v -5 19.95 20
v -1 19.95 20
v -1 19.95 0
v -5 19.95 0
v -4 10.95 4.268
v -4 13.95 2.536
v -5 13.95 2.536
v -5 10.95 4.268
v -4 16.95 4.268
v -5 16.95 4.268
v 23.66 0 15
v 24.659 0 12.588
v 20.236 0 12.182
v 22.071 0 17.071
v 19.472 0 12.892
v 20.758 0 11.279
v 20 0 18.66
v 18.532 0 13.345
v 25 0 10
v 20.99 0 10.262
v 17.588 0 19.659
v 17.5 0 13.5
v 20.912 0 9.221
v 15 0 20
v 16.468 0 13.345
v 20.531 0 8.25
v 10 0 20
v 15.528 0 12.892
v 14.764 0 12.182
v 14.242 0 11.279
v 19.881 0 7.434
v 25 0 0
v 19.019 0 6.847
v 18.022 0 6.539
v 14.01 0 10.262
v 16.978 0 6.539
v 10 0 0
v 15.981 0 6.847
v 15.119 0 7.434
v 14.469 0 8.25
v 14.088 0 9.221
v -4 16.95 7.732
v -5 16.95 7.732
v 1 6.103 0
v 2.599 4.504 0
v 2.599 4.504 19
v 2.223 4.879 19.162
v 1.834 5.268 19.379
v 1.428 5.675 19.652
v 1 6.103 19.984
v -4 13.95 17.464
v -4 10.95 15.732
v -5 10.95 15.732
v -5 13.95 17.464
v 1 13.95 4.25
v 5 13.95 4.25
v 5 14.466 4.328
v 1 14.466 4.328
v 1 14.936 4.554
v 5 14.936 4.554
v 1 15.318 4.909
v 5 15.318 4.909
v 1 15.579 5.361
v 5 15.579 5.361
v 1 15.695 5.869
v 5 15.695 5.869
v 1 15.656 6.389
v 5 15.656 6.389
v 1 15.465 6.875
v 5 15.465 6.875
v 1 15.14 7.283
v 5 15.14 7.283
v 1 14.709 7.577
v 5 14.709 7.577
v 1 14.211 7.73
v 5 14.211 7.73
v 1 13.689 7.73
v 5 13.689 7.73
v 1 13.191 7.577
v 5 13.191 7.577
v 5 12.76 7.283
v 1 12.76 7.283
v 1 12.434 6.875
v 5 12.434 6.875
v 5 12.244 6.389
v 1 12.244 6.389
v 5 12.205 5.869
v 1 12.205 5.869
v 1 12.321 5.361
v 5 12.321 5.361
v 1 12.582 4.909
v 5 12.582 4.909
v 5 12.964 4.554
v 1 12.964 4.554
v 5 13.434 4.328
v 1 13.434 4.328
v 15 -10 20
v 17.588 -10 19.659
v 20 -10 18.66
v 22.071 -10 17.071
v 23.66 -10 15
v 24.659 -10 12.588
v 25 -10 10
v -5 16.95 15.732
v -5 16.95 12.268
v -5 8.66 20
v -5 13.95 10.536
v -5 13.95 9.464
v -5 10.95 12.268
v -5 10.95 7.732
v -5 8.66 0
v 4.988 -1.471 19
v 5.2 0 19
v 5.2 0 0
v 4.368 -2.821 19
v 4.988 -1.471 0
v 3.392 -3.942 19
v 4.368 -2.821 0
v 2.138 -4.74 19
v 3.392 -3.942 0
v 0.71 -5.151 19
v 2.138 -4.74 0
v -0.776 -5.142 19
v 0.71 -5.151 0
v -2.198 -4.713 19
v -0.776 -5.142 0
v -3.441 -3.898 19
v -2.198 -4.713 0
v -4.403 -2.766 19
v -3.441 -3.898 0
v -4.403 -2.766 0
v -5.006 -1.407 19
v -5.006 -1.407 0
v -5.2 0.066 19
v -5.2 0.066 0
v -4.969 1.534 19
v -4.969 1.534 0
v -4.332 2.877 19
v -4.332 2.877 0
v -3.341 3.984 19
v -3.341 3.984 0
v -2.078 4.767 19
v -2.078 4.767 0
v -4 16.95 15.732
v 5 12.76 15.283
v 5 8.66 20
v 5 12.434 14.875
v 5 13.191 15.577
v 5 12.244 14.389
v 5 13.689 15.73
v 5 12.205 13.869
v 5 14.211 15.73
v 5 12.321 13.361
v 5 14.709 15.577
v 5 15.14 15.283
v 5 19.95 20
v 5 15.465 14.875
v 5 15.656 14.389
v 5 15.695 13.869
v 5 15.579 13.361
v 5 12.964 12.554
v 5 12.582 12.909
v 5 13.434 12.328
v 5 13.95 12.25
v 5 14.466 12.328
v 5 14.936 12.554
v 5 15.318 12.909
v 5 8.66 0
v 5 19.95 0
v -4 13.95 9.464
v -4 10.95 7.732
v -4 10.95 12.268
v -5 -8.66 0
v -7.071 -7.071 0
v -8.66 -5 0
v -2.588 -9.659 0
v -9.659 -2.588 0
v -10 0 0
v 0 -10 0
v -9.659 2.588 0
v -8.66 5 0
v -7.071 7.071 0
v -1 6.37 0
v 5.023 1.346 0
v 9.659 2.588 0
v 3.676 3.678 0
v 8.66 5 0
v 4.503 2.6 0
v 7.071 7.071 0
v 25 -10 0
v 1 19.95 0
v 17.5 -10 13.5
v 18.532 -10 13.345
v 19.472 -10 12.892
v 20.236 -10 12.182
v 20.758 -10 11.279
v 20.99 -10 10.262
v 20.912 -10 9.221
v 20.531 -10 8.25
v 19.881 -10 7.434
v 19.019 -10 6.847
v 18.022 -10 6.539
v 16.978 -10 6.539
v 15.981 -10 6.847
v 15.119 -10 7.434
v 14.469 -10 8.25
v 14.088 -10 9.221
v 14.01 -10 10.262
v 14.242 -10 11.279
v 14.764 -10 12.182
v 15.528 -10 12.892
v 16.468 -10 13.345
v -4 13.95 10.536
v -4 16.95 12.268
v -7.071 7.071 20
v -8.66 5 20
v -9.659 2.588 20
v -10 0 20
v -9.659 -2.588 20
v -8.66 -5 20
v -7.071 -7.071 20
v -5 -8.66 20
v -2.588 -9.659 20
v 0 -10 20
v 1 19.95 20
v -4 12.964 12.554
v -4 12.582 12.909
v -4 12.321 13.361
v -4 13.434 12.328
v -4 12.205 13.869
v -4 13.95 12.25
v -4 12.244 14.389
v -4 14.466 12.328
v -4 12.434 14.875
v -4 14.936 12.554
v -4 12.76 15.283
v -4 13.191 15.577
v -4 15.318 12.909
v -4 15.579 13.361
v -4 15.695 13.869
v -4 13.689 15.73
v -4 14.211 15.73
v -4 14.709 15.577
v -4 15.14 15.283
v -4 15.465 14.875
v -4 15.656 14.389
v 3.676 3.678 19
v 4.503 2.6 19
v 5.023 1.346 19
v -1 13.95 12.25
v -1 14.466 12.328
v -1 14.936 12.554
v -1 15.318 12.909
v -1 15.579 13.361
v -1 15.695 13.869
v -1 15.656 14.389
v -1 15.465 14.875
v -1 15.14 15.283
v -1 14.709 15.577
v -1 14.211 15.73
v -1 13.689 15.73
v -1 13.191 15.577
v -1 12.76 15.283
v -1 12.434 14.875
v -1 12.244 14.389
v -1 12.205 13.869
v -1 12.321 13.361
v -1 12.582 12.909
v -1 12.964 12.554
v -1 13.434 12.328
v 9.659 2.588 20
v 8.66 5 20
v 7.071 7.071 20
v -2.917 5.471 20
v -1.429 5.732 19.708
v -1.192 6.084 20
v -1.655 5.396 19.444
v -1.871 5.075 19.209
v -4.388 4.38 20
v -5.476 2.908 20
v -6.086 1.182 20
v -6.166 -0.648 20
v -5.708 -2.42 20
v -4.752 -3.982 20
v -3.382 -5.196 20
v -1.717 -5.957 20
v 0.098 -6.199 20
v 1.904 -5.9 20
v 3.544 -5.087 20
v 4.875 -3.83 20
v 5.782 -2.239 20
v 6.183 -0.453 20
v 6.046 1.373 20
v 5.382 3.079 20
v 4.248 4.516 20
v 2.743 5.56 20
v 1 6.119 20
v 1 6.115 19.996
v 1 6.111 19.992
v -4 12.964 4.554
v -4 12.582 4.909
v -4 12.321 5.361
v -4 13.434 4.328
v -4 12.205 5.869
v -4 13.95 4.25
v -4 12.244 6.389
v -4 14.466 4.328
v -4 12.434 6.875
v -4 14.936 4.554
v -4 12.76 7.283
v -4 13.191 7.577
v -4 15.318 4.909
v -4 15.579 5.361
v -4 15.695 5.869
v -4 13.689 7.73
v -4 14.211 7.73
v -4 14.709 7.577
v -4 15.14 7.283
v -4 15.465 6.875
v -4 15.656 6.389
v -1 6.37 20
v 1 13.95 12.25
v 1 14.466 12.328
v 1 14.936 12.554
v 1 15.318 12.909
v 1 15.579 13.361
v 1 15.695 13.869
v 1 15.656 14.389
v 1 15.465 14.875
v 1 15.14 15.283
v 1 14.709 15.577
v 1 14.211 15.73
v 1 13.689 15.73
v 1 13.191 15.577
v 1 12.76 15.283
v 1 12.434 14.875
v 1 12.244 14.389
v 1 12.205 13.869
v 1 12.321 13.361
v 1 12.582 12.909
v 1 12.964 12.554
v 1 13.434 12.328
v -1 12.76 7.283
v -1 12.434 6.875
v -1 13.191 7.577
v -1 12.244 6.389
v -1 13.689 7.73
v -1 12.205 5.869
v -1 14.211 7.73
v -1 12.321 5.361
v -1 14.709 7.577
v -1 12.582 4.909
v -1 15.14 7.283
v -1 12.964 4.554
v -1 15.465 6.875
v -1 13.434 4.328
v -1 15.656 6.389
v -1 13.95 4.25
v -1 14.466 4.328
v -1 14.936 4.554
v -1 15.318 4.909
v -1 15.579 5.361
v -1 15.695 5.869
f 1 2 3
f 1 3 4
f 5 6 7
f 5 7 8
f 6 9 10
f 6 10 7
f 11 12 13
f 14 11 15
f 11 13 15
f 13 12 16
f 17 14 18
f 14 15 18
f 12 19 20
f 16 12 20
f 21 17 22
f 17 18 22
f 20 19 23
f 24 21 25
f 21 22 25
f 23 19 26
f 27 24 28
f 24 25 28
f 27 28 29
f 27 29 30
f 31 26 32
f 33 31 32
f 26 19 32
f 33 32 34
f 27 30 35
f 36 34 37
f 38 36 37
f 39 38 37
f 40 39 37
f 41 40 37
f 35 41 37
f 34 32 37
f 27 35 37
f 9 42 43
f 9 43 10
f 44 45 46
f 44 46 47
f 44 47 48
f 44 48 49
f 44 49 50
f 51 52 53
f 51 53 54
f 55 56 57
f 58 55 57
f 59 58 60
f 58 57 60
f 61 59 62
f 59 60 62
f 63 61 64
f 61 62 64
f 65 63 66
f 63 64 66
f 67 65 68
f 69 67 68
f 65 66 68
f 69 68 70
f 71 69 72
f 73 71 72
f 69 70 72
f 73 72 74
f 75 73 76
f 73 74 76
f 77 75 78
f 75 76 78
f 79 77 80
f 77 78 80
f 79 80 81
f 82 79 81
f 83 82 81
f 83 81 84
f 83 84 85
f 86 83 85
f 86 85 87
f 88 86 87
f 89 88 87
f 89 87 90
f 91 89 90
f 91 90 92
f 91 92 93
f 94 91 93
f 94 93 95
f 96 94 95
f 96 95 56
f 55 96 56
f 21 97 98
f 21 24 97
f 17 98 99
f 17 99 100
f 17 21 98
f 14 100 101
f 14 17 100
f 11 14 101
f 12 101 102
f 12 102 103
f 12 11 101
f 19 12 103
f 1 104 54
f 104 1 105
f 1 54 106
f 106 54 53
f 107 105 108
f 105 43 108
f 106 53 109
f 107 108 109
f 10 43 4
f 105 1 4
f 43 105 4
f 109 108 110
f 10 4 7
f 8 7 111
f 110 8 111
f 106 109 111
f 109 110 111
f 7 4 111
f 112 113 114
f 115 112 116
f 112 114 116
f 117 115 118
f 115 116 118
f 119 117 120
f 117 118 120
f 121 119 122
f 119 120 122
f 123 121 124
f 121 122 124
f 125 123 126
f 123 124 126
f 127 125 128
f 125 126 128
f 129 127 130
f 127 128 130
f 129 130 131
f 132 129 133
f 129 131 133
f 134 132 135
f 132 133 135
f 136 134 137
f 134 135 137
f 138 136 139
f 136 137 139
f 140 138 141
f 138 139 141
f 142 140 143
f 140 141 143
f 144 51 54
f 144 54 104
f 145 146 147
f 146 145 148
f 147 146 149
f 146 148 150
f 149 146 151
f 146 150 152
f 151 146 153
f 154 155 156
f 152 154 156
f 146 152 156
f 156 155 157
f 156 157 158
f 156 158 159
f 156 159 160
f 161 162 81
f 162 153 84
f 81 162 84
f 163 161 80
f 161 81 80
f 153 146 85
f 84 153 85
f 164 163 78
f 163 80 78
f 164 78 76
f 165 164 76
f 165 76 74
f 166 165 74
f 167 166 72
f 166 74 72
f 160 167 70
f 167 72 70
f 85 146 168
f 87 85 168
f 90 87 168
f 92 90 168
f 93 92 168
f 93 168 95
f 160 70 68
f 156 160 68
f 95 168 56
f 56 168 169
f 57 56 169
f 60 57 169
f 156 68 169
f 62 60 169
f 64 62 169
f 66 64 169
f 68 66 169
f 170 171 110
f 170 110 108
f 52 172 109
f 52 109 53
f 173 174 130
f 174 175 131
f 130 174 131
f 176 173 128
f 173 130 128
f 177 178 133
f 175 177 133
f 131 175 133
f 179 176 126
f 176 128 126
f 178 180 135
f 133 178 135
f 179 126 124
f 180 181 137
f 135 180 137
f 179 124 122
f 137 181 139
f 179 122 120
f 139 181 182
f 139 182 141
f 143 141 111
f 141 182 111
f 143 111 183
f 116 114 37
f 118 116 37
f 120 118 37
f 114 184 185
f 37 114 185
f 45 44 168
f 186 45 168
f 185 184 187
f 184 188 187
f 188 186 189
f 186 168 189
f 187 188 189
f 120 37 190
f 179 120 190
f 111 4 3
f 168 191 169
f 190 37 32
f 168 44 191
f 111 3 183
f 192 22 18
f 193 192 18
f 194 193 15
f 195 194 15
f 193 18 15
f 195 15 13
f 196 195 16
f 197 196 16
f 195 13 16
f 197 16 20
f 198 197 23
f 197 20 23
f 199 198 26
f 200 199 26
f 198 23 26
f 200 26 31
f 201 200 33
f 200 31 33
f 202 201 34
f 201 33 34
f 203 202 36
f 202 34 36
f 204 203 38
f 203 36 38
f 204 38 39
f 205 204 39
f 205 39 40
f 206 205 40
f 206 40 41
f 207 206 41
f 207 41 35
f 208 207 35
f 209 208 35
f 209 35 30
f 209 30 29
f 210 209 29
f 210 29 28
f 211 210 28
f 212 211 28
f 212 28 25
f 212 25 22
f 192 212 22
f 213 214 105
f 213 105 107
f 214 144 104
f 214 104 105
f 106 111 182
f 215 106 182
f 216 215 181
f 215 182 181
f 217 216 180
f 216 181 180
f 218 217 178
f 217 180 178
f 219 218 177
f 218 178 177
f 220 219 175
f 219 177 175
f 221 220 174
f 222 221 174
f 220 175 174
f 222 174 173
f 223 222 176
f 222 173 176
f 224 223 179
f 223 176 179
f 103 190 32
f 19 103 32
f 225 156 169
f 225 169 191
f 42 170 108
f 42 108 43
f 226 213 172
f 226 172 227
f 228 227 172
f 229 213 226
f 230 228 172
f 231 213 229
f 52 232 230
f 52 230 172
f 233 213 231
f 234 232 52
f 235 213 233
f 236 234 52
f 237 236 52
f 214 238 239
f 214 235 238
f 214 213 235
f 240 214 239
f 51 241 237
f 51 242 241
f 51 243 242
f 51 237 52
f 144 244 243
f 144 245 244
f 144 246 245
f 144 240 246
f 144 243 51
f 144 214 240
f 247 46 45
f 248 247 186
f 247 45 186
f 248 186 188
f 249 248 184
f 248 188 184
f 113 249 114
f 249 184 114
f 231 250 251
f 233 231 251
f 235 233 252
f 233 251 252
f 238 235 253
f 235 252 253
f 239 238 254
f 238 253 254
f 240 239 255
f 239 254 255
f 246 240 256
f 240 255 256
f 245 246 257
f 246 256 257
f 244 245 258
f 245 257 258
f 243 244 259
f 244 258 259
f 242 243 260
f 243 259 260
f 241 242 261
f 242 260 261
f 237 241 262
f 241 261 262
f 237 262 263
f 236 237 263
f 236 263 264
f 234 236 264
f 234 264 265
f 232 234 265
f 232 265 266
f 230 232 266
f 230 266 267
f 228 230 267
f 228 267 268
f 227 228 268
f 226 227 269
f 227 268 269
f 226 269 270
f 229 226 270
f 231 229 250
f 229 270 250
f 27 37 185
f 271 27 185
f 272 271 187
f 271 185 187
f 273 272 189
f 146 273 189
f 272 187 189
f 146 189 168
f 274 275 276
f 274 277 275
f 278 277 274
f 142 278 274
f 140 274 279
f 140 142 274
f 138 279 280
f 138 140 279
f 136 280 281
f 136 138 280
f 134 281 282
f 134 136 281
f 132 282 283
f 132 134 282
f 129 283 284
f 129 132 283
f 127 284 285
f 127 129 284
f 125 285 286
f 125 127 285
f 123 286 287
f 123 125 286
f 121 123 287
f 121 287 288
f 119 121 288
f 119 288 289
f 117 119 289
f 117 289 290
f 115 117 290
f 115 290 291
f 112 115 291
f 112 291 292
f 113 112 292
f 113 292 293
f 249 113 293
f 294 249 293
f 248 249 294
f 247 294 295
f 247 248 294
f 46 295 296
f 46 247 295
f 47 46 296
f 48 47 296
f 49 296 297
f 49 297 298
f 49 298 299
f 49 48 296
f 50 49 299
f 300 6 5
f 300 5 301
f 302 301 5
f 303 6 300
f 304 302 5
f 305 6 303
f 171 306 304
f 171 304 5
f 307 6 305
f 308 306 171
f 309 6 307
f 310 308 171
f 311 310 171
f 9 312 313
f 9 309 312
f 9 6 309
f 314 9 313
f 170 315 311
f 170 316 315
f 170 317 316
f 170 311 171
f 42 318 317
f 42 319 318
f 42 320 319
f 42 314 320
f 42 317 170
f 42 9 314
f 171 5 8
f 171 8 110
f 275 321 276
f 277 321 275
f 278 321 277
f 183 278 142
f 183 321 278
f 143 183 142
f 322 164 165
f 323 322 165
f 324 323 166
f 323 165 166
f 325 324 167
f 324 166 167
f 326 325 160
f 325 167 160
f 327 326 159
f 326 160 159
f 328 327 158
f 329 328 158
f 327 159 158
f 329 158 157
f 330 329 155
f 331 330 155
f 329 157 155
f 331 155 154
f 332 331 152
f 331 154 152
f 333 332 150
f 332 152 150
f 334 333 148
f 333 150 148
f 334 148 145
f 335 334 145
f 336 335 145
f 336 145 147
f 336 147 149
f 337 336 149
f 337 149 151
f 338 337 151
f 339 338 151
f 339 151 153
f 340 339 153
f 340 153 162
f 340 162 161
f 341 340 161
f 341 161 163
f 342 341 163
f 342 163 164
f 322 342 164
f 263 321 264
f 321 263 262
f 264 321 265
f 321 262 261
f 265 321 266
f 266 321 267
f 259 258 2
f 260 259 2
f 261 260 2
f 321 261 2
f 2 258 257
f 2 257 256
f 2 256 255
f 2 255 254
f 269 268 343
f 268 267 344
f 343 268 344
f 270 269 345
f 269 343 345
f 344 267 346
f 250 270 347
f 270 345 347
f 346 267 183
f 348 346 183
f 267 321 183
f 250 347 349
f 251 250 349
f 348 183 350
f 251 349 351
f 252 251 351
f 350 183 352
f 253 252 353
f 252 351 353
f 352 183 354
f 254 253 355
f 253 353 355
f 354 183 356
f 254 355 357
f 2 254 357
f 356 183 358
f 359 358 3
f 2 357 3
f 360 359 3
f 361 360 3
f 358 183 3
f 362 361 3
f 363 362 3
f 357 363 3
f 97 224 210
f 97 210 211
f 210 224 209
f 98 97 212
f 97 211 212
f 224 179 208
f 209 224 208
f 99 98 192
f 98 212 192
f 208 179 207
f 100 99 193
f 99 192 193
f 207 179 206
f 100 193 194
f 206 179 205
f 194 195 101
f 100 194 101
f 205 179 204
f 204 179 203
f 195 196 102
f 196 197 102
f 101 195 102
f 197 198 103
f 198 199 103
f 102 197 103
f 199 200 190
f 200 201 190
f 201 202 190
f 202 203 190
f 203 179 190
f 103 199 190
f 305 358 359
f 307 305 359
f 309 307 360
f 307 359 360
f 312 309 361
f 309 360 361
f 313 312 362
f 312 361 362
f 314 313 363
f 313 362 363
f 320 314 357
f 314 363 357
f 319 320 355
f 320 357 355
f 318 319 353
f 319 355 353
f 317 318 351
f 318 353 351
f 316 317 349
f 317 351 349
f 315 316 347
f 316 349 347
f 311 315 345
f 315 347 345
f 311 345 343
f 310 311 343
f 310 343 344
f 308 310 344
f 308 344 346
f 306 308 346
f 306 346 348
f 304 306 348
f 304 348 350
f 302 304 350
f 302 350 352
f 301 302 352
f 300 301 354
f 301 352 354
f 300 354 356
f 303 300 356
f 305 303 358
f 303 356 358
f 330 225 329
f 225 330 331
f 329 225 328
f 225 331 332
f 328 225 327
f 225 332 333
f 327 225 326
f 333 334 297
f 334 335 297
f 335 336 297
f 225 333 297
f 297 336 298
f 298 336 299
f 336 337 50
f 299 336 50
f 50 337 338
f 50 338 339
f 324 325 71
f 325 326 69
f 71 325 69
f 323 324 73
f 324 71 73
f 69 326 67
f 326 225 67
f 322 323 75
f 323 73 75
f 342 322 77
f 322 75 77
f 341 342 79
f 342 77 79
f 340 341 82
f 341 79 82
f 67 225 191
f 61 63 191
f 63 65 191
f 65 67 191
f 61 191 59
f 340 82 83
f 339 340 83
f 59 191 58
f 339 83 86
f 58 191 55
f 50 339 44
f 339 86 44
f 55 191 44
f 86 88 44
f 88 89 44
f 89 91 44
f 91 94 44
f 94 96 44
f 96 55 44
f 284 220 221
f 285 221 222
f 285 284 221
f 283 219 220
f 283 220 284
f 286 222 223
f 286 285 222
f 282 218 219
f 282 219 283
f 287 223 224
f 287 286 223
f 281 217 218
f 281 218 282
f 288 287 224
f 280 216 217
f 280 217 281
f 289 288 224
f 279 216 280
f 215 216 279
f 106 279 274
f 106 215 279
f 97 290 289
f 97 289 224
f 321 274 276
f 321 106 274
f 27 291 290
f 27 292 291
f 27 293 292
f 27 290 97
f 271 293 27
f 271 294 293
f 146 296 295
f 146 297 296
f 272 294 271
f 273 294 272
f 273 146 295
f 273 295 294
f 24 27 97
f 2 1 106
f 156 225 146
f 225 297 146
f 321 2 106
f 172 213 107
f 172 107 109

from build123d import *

# Parameters (mm, degrees)
DODANIE_WYCI_GNI_CIE1_DEPTH = 20
SFAZOWANIE1_SIZE            = 1.267383774
SFAZOWANIE1_SIZE_2          = 1
SZKIC2_R                    = 1.75
WYTNIJ_WYCI_GNI_CIE1_DEPTH  = 10
WYTNIJ_WYCI_GNI_CIE2_START  = -1
SZKIC3_R                    = 1.75
WYTNIJ_WYCI_GNI_CIE2_DEPTH  = 1
DODANIE_WYCI_GNI_CIE2_START = -20
DODANIE_WYCI_GNI_CIE2_DEPTH = 20
SZKIC5_R                    = 3.5
WYTNIJ_WYCI_GNI_CIE3_DEPTH  = 20
ZAOKR_GLENIE1_R             = 10


with BuildPart() as part:
    # Szkic1 → Dodanie-wyciągnięcie1 (new body)
    with BuildSketch(Plane.XY):
        with BuildLine():
            ThreePointArc((5.2, 0), (-3.304542328, -4.01497198), (-1, 5.102940329))
            Line((-1, 5.102940329), (-1, 9.949874371))
            ThreePointArc((-1, 9.949874371), (-3.068514323, 9.517574263), (-5, 8.660254038))
            ThreePointArc((-5, 8.660254038), (-5, -8.660254038), (10, 0))
            ThreePointArc((10, 0), (8.660254038, 5), (5, 8.660254038))
            ThreePointArc((5, 8.660254038), (3.068514323, 9.517574263), (1, 9.949874371))
            Line((1, 9.949874371), (1, 5.102940329))
            ThreePointArc((1, 5.102940329), (4.01497198, 3.304542328), (5.2, 0))
        make_face()
        with BuildLine():
            ThreePointArc((-5, 8.660254038), (-3.068514323, 9.517574263), (-1, 9.949874371))
            Line((-1, 9.949874371), (-1, 19.949874371))
            Line((-1, 19.949874371), (-5, 19.949874371))
            Line((-5, 19.949874371), (-5, 8.660254038))
        make_face()
        with BuildLine():
            Line((1, 19.949874371), (1, 9.949874371))
            ThreePointArc((1, 9.949874371), (3.068514323, 9.517574263), (5, 8.660254038))
            Line((5, 8.660254038), (5, 19.949874371))
            Line((5, 19.949874371), (1, 19.949874371))
        make_face()
    extrude(amount=DODANIE_WYCI_GNI_CIE1_DEPTH)

    # Sfazowanie1
    # the kernel refuses this chamfer: 1.267383774, 1 mm, written as the material it takes off along each edge
    with BuildSketch(Plane(origin=(-1, 5.102940329, -3.274401996), x_dir=(0, 1, 0), z_dir=(0, 0, 1))) as sfazowanie1_piece_1:
        with BuildLine():
            Line((SFAZOWANIE1_SIZE, 0), (-0.336229117, 1.078091485))
            ThreePointArc((-0.336229117, 1.078091485), (-0.144735056, 0.567227001), (0, 0))
            Line((0, 0), (SFAZOWANIE1_SIZE, 0))
        make_face()
    extrude(amount=26.548803992, mode=Mode.SUBTRACT)
    with BuildSketch(Plane(origin=(1, 5.102940329, -4.38469538), x_dir=(0.9364406344520153, -0.35082607962793627, 0), z_dir=(0, 0, 1))) as sfazowanie1_piece_2:
        with BuildLine():
            Line((1.707607831, 0), (-SFAZOWANIE1_SIZE_2 * 0.350826079628, SFAZOWANIE1_SIZE_2 * 0.936440634452))
            Line((-SFAZOWANIE1_SIZE_2 * 0.350826079628, SFAZOWANIE1_SIZE_2 * 0.936440634452), (0, 0))
            ThreePointArc((0, 0), (0.877241421, 0.070520422), (1.707607831, 0))
        make_face()
    extrude(amount=28.76939076, mode=Mode.SUBTRACT)
    # the kernel refuses this chamfer: 1.267383774, 1 mm, written as the material it takes off along each edge
    with BuildSketch(Plane(origin=(0, 0, 20), x_dir=(0.05297189927018693, 0.9985960033405447, 0), z_dir=(0.9985960033405447, -0.05297189927018693, 0))) as sfazowanie1_2_piece_1:
        Polygon((5.2 + SFAZOWANIE1_SIZE_2, 0), (5.2, -SFAZOWANIE1_SIZE_2), (5.2, 0), align=None)
    revolve(axis=Axis((0, 0, 20), (0, 0, 1)), revolution_arc=359.64, mode=Mode.SUBTRACT)

    # Szkic2 → Wytnij-wyciągnięcie1 (cut)
    with BuildSketch(Plane(origin=(5, 0, 0), x_dir=(0, 0, -1), z_dir=(1, 0, 0))):
        with Locations((-14, 13.949874371)):
            Circle(SZKIC2_R)
        with Locations((-6, 13.949874371)):
            Circle(SZKIC2_R)
    extrude(amount=-WYTNIJ_WYCI_GNI_CIE1_DEPTH, mode=Mode.SUBTRACT)

    # Szkic3 → Wytnij-wyciągnięcie2 (cut)
    # profile 1 of 2: a face of its own
    with BuildSketch(Plane.ZY.offset(5).offset(WYTNIJ_WYCI_GNI_CIE2_START)):
        Polygon((9.464101615, 13.949874371), (7.732050808, 16.949874371), (4.267949192, 16.949874371), (2.535898385, 13.949874371), (4.267949192, 10.949874371), (7.732050808, 10.949874371), align=None)
        with Locations(Location((6, 13.949874371, 0), (0, 0, 270))):
            Circle(SZKIC3_R, mode=Mode.SUBTRACT)
    # profile 2 of 2: a face of its own
    with BuildSketch(Plane.ZY.offset(5).offset(WYTNIJ_WYCI_GNI_CIE2_START)):
        Polygon((10.535898385, 13.949874371), (12.267949192, 10.949874371), (15.732050808, 10.949874371), (17.464101615, 13.949874371), (15.732050808, 16.949874371), (12.267949192, 16.949874371), align=None)
        with Locations(Location((14, 13.949874371, 0), (0, 0, 270))):
            Circle(SZKIC3_R, mode=Mode.SUBTRACT)
    extrude(amount=WYTNIJ_WYCI_GNI_CIE2_DEPTH, mode=Mode.SUBTRACT)

    # Szkic4 → Dodanie-wyciągnięcie2 (add)
    with BuildSketch(Plane.XY.offset(20).offset(DODANIE_WYCI_GNI_CIE2_START)):
        with BuildLine():
            ThreePointArc((10, 0), (7.071067812, -7.071067812), (0, -10))
            Line((0, -10), (25, -10))
            Line((25, -10), (25, 0))
            Line((25, 0), (10, 0))
        make_face()
    extrude(amount=DODANIE_WYCI_GNI_CIE2_DEPTH)

    # Szkic5 → Wytnij-wyciągnięcie3 (cut)
    with BuildSketch(Plane(origin=(0, 0, 0), x_dir=(1, 0, 0), z_dir=(0, 1, 0))):
        with Locations(Location((17.5, -10, 0), (0, 0, 270))):
            Circle(SZKIC5_R)
    extrude(amount=-WYTNIJ_WYCI_GNI_CIE3_DEPTH, mode=Mode.SUBTRACT)

    # Zaokrąglenie1
    zaokr_glenie1_edges = [part.edges().sort_by_distance(p)[0] for p in [
        (25, -5, 20),
    ]]
    fillet(zaokr_glenie1_edges, radius=ZAOKR_GLENIE1_R)


solid = part.part
